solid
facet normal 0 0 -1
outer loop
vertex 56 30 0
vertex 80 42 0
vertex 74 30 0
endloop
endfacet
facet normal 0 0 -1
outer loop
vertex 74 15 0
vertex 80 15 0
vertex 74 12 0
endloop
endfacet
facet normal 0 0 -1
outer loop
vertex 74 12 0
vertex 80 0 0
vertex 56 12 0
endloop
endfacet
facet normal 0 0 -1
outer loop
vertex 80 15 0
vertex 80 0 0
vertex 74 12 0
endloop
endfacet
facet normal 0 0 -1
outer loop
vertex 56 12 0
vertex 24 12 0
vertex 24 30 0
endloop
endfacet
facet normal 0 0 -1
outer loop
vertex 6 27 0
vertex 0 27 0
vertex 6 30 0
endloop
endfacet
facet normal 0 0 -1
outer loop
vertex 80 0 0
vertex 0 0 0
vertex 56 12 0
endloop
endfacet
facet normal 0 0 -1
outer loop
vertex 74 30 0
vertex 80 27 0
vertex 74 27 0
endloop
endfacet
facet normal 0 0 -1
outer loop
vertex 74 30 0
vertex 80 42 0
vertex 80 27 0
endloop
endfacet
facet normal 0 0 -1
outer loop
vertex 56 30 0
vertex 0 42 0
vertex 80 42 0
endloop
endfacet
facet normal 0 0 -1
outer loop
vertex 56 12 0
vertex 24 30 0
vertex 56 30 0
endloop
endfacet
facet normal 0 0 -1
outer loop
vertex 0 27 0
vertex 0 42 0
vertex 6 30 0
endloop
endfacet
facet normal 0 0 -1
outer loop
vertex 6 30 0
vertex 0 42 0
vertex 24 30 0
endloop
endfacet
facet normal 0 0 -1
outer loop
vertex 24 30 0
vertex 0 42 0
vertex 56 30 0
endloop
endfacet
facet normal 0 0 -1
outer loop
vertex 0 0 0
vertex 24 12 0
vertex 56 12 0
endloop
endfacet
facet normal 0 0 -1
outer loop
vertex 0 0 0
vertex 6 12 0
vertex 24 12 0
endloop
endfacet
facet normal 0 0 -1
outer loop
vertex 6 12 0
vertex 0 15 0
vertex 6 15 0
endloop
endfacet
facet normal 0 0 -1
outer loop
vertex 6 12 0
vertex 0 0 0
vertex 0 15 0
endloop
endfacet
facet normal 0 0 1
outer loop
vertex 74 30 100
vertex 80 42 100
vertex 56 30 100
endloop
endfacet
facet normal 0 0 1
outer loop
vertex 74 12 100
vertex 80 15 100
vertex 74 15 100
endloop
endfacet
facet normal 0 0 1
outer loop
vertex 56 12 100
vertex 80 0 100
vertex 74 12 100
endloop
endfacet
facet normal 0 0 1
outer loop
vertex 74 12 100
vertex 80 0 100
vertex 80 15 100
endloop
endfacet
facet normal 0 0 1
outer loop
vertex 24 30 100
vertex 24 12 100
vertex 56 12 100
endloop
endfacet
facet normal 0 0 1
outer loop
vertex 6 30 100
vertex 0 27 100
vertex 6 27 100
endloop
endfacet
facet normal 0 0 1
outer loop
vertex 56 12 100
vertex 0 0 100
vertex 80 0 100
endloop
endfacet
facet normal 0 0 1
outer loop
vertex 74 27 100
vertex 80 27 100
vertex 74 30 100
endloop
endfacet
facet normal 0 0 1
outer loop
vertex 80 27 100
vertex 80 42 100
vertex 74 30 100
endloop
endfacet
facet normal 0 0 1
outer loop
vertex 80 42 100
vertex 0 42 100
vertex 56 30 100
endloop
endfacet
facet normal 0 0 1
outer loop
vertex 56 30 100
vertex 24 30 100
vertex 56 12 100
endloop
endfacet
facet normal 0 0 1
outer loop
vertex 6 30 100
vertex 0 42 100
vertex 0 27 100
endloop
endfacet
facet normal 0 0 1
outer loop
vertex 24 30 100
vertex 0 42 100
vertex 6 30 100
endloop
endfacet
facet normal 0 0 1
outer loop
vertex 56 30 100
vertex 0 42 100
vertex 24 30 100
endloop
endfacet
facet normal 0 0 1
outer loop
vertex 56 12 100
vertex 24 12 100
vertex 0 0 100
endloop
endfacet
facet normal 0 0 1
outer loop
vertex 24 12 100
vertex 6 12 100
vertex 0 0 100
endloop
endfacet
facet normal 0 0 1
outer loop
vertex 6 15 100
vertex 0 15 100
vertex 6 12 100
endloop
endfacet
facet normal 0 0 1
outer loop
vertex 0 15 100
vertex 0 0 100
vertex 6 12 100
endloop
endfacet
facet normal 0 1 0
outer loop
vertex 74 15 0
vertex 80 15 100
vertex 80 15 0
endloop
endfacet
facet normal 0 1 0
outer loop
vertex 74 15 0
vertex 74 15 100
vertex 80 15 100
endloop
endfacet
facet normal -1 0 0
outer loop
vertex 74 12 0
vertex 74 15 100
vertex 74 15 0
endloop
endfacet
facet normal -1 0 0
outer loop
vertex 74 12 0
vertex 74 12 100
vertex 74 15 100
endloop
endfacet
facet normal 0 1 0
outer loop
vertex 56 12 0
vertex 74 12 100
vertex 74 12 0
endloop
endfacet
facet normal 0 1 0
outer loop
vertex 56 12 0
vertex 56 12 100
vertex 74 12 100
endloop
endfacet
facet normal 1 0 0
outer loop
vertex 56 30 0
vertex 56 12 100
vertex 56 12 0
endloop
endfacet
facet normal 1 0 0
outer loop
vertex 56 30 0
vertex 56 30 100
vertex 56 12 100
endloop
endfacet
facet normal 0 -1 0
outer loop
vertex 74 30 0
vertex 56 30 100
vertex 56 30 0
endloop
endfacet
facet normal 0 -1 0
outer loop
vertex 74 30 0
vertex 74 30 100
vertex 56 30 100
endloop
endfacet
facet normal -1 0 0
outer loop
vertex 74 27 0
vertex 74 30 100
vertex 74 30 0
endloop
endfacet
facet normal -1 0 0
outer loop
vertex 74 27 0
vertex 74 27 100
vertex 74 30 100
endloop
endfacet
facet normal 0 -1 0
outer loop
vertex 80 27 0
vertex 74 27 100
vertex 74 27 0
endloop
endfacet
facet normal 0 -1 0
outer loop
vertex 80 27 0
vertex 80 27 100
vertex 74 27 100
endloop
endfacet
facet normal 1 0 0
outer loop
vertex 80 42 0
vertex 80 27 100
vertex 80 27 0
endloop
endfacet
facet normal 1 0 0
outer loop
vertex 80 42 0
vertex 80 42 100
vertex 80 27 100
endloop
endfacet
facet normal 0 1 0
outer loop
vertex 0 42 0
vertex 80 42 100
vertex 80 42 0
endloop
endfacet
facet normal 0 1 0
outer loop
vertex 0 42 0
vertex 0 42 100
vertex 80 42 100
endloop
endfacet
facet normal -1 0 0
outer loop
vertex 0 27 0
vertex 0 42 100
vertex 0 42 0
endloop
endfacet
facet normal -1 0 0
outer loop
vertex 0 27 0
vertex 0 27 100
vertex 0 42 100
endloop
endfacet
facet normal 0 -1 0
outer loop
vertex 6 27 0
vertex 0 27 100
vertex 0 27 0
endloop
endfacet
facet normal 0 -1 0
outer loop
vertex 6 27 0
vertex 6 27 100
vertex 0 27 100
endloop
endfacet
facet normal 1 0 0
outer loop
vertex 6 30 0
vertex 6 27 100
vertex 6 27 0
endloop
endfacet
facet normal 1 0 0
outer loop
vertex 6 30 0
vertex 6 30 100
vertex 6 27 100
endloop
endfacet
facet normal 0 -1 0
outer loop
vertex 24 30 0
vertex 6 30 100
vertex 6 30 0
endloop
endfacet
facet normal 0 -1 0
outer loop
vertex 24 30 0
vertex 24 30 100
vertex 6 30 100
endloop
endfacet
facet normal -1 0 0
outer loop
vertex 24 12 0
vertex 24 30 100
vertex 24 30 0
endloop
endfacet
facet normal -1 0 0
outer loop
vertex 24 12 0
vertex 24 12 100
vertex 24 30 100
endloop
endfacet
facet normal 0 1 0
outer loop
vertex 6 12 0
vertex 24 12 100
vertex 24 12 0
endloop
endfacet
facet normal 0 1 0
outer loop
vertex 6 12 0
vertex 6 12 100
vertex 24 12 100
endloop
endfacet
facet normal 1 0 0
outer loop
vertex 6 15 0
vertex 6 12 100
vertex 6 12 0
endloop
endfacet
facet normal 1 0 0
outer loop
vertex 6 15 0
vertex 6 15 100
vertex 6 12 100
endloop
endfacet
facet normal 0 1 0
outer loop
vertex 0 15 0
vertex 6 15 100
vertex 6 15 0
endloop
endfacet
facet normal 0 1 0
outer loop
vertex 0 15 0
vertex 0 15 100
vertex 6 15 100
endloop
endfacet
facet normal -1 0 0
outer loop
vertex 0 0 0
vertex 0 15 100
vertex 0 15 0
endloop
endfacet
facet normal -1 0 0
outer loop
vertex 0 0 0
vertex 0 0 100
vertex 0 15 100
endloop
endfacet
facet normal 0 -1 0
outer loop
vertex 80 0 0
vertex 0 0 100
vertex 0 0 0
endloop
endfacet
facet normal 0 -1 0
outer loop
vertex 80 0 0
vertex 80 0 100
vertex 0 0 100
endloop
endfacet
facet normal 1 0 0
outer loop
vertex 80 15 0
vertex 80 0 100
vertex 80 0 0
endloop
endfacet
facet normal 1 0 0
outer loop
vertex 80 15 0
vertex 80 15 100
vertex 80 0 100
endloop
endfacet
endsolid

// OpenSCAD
$fn = 32;

// ----------------------------------------------------------------------
// T-slot rail: 80 x 42 mm section, 100 mm long
// ----------------------------------------------------------------------

// --- parameters (mm) ---
profile_height = 100;     // extrusion height
profile_points = 20;      // points of the closed outline

profile = [[0, 0], [80, 0], [80, 15], [74, 15], [74, 12], [56, 12], [56, 30], [74, 30], [74, 27], [80, 27], [80, 42], [0, 42], [0, 27], [6, 27], [6, 30], [24, 30], [24, 12], [6, 12], [6, 15], [0, 15]];  // single closed polygon, 20 points, counter clockwise

// --- the one profile operation ---
linear_extrude(height = profile_height) polygon(points = profile);
